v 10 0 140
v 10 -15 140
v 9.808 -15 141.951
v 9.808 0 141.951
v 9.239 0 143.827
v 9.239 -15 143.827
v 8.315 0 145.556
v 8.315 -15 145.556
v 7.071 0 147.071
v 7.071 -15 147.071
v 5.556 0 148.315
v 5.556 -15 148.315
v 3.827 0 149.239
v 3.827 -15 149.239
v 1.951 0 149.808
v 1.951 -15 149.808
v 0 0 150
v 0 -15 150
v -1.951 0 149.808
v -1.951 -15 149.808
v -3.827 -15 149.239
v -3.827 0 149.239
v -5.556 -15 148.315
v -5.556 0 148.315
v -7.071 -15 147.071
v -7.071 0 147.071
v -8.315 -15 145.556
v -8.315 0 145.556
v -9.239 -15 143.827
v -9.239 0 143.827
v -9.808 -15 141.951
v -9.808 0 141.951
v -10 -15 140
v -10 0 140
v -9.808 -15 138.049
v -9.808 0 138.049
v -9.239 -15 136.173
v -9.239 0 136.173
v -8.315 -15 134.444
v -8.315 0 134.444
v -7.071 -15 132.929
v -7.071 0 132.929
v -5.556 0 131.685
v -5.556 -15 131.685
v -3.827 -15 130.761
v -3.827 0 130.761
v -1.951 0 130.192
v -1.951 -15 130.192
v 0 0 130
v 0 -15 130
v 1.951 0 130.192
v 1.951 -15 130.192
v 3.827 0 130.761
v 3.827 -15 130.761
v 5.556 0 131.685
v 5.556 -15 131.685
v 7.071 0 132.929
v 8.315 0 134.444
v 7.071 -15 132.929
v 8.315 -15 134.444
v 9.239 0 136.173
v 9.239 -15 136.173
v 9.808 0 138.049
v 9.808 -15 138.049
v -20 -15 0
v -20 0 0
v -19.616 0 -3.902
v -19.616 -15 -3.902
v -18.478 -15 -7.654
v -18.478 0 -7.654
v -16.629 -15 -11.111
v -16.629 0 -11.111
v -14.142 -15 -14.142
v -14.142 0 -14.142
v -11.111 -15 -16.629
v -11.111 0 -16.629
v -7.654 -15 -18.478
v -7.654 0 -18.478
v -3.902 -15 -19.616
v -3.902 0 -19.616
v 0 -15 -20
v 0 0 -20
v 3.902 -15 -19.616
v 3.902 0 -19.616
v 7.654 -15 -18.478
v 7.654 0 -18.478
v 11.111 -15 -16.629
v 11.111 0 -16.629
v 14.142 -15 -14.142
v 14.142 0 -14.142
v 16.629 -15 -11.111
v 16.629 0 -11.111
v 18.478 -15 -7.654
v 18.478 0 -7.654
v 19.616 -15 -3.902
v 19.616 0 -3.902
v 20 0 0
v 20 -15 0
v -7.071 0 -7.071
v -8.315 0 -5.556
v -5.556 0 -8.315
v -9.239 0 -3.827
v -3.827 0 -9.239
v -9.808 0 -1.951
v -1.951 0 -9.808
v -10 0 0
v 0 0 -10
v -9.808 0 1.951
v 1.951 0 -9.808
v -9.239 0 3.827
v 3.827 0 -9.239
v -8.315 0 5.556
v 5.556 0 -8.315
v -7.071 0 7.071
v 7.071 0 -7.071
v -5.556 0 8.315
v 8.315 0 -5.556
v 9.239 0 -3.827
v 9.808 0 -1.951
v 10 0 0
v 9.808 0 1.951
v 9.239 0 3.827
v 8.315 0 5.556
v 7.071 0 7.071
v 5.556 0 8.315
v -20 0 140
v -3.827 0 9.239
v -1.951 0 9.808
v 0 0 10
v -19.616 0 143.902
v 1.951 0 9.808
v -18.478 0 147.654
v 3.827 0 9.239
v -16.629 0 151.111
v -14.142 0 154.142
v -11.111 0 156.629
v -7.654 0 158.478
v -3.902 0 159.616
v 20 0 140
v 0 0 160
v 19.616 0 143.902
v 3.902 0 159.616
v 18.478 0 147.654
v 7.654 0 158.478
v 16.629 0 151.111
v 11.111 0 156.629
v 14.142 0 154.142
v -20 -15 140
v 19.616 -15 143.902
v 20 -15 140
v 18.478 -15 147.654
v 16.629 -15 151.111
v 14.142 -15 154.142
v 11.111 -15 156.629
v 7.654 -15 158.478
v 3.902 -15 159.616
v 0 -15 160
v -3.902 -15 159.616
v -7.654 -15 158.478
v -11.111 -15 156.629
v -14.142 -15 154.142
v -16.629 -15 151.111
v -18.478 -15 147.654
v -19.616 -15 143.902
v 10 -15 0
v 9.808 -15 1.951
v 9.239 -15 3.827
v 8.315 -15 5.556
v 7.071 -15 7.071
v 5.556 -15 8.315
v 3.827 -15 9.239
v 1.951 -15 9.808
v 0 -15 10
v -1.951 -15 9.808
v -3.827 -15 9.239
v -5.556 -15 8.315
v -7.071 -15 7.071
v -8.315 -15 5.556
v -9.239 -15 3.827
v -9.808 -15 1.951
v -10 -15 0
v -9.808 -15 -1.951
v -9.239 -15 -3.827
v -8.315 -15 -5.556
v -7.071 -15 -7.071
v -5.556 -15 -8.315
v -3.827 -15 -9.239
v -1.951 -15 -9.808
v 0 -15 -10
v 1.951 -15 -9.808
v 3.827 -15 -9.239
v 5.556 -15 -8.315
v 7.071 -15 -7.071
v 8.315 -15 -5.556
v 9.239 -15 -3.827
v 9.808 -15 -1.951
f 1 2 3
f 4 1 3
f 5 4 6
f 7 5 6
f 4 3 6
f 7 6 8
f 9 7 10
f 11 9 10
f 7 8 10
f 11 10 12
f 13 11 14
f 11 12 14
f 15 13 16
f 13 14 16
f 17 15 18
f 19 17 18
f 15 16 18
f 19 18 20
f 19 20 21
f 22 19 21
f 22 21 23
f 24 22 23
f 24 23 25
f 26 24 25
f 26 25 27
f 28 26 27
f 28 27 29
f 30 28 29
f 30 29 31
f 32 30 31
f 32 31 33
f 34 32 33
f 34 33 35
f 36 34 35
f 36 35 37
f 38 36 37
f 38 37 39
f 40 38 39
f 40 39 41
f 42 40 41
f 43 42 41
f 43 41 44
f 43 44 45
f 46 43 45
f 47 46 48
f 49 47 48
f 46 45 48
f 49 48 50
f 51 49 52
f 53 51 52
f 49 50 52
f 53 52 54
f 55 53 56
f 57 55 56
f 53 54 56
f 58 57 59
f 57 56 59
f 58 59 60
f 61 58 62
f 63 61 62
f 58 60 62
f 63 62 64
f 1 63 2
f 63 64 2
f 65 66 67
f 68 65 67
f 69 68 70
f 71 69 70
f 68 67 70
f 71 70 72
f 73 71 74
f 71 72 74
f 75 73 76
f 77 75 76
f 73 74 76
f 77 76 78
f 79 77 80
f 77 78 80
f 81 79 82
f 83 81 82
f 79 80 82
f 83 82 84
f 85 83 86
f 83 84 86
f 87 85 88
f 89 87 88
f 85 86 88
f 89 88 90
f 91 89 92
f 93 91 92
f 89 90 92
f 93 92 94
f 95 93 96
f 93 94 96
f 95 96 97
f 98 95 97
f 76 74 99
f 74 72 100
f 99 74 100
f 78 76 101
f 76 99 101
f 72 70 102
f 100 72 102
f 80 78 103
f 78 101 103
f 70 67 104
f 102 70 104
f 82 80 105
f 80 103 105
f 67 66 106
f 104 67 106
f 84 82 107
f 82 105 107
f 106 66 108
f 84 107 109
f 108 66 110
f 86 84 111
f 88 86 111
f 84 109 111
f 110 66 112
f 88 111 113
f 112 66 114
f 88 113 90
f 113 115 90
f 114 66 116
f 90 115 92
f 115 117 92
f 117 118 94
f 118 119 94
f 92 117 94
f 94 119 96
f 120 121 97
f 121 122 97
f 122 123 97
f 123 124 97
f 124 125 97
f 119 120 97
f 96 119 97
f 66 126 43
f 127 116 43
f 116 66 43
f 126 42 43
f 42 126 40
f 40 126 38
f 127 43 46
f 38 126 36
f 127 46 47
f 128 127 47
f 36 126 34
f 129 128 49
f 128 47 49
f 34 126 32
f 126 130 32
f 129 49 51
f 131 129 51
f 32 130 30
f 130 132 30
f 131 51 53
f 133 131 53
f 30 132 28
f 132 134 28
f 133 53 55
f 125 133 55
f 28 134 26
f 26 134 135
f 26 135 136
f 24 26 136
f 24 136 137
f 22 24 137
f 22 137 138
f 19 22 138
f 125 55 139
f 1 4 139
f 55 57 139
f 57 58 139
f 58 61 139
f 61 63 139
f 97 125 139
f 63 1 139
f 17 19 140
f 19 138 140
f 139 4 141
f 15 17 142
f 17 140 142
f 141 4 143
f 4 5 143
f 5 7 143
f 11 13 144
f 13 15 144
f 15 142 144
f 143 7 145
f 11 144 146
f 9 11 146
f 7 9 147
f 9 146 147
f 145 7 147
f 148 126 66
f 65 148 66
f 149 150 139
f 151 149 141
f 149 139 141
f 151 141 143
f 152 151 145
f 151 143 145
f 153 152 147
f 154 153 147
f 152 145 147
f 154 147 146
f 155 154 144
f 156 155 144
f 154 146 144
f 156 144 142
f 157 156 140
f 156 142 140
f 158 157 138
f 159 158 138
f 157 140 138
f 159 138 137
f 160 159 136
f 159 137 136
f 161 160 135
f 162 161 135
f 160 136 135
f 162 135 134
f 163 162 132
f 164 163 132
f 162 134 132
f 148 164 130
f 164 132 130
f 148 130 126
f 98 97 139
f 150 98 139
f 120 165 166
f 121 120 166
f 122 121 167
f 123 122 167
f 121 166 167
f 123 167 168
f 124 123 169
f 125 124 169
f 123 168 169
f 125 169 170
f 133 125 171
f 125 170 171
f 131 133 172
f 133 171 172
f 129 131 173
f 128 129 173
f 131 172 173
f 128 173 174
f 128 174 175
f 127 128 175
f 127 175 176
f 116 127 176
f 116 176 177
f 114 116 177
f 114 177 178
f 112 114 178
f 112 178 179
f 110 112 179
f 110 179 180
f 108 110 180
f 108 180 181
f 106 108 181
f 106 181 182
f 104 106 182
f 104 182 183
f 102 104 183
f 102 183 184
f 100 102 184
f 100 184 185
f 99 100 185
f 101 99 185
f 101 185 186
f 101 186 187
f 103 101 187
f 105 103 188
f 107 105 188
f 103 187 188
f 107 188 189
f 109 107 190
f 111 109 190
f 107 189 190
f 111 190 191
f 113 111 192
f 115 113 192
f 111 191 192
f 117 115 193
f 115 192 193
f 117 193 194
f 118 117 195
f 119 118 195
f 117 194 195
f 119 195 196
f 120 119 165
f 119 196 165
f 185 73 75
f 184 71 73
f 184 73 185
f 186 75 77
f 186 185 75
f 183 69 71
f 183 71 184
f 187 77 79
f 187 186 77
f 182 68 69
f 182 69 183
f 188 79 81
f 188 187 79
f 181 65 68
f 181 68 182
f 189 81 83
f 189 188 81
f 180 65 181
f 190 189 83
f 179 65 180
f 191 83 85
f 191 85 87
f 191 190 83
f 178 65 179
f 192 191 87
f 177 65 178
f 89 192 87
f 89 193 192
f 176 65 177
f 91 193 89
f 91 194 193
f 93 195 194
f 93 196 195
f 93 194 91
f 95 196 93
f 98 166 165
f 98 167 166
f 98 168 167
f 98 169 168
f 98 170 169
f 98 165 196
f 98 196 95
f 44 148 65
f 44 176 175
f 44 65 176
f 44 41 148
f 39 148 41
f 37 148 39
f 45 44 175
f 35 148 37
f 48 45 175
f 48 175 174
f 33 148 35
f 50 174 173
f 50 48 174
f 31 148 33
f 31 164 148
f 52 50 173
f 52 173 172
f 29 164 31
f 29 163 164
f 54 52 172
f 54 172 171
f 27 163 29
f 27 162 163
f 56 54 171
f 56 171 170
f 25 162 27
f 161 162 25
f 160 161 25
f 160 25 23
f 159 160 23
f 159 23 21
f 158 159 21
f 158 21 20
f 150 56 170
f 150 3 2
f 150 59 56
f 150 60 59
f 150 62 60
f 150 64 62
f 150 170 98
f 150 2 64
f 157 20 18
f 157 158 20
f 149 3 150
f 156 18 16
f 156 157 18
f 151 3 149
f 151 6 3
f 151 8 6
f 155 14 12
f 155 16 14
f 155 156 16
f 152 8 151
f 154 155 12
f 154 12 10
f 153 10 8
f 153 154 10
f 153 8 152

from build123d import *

# Parameters (mm, degrees)
F1_DEPTH = 15
F2_R     = 10
F3_DEPTH = 25


with BuildPart() as f1:
    # F0 (on Front) → F1 (new body)
    with BuildSketch(Plane.XZ):
        with BuildLine():
            ThreePointArc((-20, 0), (0, -20), (20, 0))
            ThreePointArc((20, 0), (0, 20), (-20, 0))
        make_face()
        with BuildLine():
            ThreePointArc((-20, 0), (0, 20), (20, 0))
            Line((20, 0), (20, 140))
            ThreePointArc((20, 140), (0, 120), (-20, 140))
            Line((-20, 140), (-20, 0))
        make_face()
        with BuildLine():
            ThreePointArc((-20, 140), (0, 120), (20, 140))
            ThreePointArc((20, 140), (0, 160), (-20, 140))
        make_face()
    extrude(amount=F1_DEPTH)

    # F2 (on face) → F3 (cut)
    with BuildSketch(Plane.XZ.offset(15)):
        with Locations((0, 140)):
            Circle(F2_R)
        Circle(F2_R)
    extrude(amount=-F3_DEPTH, mode=Mode.SUBTRACT)


solid = f1.part
